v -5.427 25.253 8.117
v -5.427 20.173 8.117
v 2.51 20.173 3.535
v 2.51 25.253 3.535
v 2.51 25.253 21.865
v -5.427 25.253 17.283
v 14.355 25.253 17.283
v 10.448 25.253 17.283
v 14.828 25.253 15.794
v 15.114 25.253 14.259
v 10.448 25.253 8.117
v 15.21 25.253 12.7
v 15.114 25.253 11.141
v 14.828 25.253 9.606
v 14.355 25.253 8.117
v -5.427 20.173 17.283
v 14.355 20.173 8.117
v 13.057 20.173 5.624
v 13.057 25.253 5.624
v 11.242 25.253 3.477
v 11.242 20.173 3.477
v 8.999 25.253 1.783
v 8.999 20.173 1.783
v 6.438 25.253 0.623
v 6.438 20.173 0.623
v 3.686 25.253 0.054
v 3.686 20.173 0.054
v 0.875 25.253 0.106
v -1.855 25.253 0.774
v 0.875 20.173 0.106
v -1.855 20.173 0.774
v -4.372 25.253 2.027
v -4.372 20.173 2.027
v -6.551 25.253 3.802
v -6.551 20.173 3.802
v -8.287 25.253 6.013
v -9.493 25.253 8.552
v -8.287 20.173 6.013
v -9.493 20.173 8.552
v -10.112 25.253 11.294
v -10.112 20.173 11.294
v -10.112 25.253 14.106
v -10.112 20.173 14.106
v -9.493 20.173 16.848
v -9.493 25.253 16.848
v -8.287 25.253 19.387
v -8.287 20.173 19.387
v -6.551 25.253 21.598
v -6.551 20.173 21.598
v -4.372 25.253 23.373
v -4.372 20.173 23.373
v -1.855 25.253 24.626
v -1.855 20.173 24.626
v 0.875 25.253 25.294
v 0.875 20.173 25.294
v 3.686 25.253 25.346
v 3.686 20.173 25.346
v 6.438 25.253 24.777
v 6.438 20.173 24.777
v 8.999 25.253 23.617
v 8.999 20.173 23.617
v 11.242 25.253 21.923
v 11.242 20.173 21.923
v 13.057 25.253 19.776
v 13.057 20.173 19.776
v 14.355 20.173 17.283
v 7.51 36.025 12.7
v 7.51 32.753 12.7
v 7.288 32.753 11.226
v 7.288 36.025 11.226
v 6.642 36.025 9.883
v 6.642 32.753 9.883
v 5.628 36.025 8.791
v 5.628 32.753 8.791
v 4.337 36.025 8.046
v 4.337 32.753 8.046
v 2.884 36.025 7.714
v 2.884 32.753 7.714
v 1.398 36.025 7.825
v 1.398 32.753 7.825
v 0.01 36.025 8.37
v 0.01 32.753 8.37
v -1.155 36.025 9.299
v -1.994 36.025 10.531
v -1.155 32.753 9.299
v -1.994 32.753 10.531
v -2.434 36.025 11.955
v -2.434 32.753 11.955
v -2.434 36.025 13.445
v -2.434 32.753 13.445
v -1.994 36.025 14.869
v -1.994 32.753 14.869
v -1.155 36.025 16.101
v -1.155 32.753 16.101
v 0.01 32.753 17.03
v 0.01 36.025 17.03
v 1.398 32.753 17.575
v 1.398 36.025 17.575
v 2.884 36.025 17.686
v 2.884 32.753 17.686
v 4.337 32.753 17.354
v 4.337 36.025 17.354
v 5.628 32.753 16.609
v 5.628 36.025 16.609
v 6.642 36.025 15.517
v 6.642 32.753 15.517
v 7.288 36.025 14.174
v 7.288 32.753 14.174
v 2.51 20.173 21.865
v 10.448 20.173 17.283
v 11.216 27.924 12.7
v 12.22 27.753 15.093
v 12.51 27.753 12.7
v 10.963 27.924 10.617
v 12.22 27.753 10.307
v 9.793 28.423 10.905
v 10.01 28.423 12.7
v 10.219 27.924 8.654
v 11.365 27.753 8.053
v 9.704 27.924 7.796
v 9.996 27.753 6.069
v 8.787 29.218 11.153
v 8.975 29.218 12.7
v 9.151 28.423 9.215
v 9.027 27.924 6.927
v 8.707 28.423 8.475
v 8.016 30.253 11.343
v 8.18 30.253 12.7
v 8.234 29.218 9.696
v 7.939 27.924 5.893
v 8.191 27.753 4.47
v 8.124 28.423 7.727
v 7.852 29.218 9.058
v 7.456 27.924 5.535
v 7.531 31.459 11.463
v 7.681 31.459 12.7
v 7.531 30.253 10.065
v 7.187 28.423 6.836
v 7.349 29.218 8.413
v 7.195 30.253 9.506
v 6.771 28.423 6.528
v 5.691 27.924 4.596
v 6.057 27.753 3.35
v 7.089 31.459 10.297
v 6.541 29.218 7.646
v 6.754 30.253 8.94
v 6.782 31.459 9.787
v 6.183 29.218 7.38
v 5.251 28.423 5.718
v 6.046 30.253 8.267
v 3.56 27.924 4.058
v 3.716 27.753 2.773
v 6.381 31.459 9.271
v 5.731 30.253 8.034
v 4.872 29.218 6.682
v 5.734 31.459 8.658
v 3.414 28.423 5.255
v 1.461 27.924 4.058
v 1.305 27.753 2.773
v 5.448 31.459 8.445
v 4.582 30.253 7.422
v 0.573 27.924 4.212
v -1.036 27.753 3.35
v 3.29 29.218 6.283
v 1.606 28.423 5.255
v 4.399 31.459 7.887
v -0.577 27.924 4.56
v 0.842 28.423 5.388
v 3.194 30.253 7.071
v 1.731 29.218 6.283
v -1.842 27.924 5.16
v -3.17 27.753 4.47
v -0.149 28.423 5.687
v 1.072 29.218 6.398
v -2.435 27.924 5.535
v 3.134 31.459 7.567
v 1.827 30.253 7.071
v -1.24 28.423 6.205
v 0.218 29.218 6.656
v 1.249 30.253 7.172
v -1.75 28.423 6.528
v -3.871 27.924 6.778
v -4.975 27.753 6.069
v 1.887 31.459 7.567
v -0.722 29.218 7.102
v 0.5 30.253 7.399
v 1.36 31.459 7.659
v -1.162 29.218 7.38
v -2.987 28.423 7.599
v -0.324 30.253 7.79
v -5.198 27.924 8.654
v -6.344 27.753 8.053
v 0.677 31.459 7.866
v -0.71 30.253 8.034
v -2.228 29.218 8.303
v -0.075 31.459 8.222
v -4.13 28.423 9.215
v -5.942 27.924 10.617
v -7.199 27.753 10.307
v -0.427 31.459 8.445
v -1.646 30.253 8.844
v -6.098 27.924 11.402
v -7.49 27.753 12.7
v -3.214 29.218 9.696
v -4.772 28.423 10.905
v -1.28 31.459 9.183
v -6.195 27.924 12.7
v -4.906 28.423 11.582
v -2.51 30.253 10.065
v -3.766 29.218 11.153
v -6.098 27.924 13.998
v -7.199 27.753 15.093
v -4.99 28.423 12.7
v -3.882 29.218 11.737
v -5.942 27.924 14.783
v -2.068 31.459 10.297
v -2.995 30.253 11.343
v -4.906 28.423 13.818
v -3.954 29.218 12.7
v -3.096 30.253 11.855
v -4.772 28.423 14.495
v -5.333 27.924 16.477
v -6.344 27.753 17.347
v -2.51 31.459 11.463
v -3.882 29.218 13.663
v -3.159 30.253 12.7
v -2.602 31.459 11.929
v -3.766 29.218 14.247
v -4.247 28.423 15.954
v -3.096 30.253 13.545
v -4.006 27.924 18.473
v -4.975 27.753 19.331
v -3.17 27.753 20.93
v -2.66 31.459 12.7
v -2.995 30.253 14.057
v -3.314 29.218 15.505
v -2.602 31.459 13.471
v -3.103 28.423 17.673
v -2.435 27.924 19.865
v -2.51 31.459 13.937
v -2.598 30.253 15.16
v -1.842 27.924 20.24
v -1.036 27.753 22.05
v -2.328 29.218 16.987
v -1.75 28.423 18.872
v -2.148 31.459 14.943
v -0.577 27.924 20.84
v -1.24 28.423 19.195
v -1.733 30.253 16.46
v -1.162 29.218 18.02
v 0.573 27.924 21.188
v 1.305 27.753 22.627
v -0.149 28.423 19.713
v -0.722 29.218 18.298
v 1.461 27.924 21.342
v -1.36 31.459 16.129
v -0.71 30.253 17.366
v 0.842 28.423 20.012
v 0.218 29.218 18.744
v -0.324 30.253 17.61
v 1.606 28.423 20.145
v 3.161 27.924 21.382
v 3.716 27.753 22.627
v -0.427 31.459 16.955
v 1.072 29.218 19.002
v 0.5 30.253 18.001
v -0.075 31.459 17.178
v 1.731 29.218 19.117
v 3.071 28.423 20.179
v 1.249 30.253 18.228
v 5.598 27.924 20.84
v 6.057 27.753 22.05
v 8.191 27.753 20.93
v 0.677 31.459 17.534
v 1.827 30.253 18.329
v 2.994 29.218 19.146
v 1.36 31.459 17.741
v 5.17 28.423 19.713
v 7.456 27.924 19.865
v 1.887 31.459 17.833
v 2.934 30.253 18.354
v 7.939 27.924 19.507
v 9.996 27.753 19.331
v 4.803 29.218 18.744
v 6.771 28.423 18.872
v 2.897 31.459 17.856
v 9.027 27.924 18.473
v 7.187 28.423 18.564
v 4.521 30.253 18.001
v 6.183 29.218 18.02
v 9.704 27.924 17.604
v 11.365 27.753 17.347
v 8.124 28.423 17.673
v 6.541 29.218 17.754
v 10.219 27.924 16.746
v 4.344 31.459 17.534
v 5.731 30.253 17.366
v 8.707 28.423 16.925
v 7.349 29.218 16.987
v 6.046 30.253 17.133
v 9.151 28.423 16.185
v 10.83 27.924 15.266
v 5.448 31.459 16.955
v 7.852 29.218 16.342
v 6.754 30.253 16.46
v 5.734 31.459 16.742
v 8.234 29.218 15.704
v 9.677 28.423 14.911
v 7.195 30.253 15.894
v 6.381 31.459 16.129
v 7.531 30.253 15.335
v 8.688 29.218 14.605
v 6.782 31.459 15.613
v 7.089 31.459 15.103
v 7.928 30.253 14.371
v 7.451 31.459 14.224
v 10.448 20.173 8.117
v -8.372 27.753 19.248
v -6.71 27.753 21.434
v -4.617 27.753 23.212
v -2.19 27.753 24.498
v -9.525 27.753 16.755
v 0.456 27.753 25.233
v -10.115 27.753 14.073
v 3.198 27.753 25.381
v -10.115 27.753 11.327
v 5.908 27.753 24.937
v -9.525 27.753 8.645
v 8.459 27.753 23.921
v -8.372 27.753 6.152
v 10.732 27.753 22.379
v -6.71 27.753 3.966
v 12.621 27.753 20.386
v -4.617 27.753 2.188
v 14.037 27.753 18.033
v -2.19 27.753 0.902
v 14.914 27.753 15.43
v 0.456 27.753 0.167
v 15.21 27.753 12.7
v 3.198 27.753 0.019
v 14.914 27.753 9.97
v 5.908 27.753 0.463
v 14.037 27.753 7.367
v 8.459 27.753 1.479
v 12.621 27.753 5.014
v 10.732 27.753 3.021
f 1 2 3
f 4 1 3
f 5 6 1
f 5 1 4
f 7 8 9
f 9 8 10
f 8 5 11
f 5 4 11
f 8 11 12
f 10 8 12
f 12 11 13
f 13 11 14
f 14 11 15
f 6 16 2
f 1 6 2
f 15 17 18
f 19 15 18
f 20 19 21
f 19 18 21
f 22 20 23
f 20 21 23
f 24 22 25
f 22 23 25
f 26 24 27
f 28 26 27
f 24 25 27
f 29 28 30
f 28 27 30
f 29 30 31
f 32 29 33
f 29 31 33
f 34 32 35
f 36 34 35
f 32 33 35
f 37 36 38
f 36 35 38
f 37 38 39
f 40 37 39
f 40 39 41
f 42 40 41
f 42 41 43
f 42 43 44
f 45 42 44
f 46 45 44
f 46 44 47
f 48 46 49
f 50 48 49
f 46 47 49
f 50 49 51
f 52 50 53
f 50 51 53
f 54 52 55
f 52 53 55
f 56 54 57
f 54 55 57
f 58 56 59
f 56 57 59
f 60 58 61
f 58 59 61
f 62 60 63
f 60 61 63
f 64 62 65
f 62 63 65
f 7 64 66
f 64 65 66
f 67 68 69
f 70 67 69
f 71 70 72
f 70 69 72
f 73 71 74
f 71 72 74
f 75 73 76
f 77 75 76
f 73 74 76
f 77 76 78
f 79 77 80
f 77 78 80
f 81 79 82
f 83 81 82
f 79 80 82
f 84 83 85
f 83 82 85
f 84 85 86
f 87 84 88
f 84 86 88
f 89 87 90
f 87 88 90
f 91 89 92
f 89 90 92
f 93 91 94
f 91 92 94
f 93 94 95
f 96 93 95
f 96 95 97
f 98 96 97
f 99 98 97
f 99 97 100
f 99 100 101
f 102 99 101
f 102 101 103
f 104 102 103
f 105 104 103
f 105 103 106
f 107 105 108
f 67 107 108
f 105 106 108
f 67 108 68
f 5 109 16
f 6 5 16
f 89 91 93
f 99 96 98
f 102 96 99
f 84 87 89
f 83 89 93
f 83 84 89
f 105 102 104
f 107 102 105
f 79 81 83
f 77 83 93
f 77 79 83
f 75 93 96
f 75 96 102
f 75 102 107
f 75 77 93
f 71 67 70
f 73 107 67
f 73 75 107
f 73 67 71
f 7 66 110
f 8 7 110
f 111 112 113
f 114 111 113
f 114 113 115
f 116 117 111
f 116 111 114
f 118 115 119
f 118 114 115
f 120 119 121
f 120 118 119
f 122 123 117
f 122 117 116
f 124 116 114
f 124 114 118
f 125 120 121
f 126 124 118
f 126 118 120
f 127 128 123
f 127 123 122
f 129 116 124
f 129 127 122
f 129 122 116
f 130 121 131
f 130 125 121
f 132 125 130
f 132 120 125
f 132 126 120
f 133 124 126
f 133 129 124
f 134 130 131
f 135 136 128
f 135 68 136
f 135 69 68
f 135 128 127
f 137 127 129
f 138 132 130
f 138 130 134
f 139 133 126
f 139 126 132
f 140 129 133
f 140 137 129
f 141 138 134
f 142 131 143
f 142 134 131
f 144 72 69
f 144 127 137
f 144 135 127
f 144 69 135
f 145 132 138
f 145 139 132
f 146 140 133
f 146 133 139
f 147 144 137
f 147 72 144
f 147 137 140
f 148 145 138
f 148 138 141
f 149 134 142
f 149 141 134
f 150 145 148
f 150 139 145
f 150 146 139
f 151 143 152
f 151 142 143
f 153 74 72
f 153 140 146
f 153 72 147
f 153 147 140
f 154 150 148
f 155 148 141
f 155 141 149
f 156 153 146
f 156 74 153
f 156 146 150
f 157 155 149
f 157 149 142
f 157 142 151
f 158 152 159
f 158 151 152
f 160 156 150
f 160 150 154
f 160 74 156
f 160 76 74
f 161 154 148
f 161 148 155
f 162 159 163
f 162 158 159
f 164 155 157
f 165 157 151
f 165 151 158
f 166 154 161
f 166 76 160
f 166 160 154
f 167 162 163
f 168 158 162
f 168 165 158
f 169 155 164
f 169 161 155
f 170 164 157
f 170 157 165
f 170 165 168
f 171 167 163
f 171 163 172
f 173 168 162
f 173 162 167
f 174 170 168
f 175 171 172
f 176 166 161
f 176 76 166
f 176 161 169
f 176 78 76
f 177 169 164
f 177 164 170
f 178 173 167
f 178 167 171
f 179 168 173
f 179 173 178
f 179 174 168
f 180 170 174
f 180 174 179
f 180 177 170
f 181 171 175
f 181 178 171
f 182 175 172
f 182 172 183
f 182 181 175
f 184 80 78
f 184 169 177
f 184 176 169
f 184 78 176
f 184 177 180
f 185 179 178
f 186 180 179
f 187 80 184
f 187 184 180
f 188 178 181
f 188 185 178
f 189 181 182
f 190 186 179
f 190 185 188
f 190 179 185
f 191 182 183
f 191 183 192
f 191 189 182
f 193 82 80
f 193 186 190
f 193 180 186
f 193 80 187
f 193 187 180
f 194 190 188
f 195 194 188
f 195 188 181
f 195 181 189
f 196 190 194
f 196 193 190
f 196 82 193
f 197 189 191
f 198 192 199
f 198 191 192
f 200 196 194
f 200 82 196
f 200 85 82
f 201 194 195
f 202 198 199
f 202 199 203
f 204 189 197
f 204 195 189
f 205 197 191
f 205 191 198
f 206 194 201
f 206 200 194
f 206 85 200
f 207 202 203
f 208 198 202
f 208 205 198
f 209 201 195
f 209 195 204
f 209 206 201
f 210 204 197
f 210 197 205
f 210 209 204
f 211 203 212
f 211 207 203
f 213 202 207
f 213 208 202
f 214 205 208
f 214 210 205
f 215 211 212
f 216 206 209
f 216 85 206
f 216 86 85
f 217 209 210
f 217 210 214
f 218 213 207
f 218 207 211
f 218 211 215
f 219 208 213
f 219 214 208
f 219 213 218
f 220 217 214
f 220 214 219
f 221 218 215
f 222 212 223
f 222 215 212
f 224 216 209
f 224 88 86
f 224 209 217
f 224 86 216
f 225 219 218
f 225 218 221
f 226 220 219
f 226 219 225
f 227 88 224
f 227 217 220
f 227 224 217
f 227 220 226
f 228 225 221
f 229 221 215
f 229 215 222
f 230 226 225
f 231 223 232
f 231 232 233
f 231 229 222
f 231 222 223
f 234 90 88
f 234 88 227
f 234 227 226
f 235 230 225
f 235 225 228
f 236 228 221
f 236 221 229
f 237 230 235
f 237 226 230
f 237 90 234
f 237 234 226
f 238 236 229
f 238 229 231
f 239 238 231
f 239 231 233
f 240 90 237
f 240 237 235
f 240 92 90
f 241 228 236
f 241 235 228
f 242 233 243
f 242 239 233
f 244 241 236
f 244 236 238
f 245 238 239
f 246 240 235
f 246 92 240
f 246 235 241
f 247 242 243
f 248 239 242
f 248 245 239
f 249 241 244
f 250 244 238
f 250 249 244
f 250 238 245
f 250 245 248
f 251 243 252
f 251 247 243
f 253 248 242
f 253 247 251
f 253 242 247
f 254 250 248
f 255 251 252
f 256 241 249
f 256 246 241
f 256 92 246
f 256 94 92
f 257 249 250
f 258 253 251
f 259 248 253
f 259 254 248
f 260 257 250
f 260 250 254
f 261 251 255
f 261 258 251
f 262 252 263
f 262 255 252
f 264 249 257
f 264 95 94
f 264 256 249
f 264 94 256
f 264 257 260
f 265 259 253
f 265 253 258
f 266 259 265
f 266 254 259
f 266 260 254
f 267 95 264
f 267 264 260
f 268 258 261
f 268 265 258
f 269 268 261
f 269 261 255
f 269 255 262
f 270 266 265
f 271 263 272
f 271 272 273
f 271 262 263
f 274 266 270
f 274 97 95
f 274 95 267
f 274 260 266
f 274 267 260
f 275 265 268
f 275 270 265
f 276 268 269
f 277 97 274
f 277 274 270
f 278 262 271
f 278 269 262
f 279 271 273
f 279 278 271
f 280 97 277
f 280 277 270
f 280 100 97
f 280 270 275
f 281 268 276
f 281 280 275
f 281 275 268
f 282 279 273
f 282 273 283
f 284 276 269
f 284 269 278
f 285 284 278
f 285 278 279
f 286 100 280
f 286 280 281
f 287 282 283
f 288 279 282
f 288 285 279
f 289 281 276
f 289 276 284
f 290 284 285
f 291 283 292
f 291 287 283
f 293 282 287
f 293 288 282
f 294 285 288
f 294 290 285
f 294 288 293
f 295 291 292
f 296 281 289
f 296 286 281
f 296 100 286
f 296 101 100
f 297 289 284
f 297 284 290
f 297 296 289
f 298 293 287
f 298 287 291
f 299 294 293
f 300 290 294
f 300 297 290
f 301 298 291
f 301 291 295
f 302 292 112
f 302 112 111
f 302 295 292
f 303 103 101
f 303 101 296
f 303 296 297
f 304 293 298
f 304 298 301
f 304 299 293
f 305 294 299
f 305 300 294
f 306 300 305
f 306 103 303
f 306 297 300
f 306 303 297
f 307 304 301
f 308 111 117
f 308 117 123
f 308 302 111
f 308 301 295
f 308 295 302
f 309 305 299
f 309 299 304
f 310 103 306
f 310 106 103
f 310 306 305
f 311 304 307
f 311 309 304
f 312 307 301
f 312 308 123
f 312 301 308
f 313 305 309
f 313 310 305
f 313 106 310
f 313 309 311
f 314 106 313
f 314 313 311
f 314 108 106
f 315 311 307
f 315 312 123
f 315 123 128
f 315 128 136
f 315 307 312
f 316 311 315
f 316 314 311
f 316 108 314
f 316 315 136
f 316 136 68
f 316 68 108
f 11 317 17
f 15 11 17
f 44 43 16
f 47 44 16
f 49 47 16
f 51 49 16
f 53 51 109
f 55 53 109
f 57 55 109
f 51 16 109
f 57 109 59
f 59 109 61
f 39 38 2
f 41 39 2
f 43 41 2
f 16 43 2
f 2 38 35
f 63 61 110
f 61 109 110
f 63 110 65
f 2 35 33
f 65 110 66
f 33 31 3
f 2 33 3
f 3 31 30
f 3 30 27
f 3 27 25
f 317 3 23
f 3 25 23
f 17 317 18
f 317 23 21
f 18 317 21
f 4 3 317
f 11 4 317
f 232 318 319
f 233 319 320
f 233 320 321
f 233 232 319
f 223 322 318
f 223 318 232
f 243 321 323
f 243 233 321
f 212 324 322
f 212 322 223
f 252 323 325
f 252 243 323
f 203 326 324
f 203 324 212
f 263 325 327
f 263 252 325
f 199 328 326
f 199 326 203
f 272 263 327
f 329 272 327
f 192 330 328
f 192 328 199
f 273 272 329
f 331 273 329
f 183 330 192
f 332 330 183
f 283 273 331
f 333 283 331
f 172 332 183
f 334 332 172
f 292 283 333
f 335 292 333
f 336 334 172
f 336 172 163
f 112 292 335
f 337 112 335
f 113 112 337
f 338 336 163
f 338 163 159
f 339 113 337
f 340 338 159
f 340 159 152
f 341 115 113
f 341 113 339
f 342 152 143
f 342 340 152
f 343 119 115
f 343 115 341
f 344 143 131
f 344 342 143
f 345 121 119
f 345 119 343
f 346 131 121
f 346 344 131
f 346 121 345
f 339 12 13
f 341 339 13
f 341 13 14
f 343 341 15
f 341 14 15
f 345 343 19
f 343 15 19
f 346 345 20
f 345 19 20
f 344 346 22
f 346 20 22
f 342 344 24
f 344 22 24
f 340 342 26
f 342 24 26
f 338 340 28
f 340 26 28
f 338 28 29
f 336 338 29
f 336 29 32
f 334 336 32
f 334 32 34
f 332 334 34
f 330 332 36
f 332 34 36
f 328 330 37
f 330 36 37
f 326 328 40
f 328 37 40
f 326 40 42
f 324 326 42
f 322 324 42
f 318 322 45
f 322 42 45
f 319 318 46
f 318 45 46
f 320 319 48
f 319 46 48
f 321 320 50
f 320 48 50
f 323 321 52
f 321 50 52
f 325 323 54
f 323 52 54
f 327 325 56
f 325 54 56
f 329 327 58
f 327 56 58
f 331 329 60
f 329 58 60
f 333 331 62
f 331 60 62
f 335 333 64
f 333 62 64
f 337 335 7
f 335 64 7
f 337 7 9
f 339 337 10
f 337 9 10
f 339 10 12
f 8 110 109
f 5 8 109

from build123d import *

# Parameters (mm, degrees)
BOSS_EXTRUDE1_DEPTH = 25.4
BOSS_EXTRUDE3_DEPTH = 5.08
SKETCH4_W           = 37.4
SKETCH4_H           = 25.4
CUT_EXTRUDE1_DEPTH  = 25.4
SKETCH5_R           = 12.7
BOSS_EXTRUDE4_DEPTH = 2.5
SKETCH6_R           = 5
BOSS_EXTRUDE5_DEPTH = 8.272
FILLET1_R           = 5


with BuildPart() as part:
    # Sketch1 → Boss-Extrude1 (new body)
    with BuildSketch(Plane.XY):
        Polygon((-10.189534884, 0), (-10.189534884, 9), (15.210465116, 9), (15.210465116, 0), (21.210465116, 0), (21.210465116, 20.17346), (-16.189534884, 20.17346), (-16.189534884, 0), align=None)
    extrude(amount=BOSS_EXTRUDE1_DEPTH)

    # Sketch3 → Boss-Extrude3 (add)
    with BuildSketch(Plane(origin=(0, 20.17346, 0), x_dir=(1, 0, 0), z_dir=(0, 1, 0))):
        with BuildLine():
            Line((14.354818113, -17.282717762), (10.447965116, -17.282717762))
            Line((10.447965116, -17.282717762), (2.510465116, -21.865435523))
            Line((2.510465116, -21.865435523), (-5.427034884, -17.282717762))
            Line((-5.427034884, -17.282717762), (-5.427034884, -8.117282238))
            Line((-5.427034884, -8.117282238), (2.510465116, -3.534564477))
            Line((2.510465116, -3.534564477), (10.447965116, -8.117282238))
            Line((10.447965116, -8.117282238), (14.354818113, -8.117282238))
            ThreePointArc((14.354818113, -8.117282238), (-10.189534884, -12.7), (14.354818113, -17.282717762))
        make_face()
    extrude(amount=BOSS_EXTRUDE3_DEPTH)

    # Sketch4 → Cut-Extrude1 (cut)
    with BuildSketch(Plane(origin=(0, 20.17346, 0), x_dir=(1, 0, 0), z_dir=(0, 1, 0))):
        with Locations((2.510465116, -12.7)):
            Rectangle(SKETCH4_W, SKETCH4_H)
    extrude(amount=-CUT_EXTRUDE1_DEPTH, mode=Mode.SUBTRACT)

    # Sketch5 → Boss-Extrude4 (add)
    with BuildSketch(Plane(origin=(0, 25.25346, 0), x_dir=(1, 0, 0), z_dir=(0, 1, 0))):
        with Locations((2.510465116, -12.7)):
            Circle(SKETCH5_R)
    extrude(amount=BOSS_EXTRUDE4_DEPTH)

    # Sketch6 → Boss-Extrude5 (add)
    with BuildSketch(Plane(origin=(0, 27.75346, 0), x_dir=(1, 0, 0), z_dir=(0, 1, 0))):
        with Locations((2.510465116, -12.7)):
            Circle(SKETCH6_R)
    extrude(amount=BOSS_EXTRUDE5_DEPTH)

    # Fillet1
    fillet1_edges = [part.edges().sort_by_distance(p)[0] for p in [
        (-2.489534884, 27.75346, 12.7),
    ]]
    fillet(fillet1_edges, radius=FILLET1_R)


solid = part.part
